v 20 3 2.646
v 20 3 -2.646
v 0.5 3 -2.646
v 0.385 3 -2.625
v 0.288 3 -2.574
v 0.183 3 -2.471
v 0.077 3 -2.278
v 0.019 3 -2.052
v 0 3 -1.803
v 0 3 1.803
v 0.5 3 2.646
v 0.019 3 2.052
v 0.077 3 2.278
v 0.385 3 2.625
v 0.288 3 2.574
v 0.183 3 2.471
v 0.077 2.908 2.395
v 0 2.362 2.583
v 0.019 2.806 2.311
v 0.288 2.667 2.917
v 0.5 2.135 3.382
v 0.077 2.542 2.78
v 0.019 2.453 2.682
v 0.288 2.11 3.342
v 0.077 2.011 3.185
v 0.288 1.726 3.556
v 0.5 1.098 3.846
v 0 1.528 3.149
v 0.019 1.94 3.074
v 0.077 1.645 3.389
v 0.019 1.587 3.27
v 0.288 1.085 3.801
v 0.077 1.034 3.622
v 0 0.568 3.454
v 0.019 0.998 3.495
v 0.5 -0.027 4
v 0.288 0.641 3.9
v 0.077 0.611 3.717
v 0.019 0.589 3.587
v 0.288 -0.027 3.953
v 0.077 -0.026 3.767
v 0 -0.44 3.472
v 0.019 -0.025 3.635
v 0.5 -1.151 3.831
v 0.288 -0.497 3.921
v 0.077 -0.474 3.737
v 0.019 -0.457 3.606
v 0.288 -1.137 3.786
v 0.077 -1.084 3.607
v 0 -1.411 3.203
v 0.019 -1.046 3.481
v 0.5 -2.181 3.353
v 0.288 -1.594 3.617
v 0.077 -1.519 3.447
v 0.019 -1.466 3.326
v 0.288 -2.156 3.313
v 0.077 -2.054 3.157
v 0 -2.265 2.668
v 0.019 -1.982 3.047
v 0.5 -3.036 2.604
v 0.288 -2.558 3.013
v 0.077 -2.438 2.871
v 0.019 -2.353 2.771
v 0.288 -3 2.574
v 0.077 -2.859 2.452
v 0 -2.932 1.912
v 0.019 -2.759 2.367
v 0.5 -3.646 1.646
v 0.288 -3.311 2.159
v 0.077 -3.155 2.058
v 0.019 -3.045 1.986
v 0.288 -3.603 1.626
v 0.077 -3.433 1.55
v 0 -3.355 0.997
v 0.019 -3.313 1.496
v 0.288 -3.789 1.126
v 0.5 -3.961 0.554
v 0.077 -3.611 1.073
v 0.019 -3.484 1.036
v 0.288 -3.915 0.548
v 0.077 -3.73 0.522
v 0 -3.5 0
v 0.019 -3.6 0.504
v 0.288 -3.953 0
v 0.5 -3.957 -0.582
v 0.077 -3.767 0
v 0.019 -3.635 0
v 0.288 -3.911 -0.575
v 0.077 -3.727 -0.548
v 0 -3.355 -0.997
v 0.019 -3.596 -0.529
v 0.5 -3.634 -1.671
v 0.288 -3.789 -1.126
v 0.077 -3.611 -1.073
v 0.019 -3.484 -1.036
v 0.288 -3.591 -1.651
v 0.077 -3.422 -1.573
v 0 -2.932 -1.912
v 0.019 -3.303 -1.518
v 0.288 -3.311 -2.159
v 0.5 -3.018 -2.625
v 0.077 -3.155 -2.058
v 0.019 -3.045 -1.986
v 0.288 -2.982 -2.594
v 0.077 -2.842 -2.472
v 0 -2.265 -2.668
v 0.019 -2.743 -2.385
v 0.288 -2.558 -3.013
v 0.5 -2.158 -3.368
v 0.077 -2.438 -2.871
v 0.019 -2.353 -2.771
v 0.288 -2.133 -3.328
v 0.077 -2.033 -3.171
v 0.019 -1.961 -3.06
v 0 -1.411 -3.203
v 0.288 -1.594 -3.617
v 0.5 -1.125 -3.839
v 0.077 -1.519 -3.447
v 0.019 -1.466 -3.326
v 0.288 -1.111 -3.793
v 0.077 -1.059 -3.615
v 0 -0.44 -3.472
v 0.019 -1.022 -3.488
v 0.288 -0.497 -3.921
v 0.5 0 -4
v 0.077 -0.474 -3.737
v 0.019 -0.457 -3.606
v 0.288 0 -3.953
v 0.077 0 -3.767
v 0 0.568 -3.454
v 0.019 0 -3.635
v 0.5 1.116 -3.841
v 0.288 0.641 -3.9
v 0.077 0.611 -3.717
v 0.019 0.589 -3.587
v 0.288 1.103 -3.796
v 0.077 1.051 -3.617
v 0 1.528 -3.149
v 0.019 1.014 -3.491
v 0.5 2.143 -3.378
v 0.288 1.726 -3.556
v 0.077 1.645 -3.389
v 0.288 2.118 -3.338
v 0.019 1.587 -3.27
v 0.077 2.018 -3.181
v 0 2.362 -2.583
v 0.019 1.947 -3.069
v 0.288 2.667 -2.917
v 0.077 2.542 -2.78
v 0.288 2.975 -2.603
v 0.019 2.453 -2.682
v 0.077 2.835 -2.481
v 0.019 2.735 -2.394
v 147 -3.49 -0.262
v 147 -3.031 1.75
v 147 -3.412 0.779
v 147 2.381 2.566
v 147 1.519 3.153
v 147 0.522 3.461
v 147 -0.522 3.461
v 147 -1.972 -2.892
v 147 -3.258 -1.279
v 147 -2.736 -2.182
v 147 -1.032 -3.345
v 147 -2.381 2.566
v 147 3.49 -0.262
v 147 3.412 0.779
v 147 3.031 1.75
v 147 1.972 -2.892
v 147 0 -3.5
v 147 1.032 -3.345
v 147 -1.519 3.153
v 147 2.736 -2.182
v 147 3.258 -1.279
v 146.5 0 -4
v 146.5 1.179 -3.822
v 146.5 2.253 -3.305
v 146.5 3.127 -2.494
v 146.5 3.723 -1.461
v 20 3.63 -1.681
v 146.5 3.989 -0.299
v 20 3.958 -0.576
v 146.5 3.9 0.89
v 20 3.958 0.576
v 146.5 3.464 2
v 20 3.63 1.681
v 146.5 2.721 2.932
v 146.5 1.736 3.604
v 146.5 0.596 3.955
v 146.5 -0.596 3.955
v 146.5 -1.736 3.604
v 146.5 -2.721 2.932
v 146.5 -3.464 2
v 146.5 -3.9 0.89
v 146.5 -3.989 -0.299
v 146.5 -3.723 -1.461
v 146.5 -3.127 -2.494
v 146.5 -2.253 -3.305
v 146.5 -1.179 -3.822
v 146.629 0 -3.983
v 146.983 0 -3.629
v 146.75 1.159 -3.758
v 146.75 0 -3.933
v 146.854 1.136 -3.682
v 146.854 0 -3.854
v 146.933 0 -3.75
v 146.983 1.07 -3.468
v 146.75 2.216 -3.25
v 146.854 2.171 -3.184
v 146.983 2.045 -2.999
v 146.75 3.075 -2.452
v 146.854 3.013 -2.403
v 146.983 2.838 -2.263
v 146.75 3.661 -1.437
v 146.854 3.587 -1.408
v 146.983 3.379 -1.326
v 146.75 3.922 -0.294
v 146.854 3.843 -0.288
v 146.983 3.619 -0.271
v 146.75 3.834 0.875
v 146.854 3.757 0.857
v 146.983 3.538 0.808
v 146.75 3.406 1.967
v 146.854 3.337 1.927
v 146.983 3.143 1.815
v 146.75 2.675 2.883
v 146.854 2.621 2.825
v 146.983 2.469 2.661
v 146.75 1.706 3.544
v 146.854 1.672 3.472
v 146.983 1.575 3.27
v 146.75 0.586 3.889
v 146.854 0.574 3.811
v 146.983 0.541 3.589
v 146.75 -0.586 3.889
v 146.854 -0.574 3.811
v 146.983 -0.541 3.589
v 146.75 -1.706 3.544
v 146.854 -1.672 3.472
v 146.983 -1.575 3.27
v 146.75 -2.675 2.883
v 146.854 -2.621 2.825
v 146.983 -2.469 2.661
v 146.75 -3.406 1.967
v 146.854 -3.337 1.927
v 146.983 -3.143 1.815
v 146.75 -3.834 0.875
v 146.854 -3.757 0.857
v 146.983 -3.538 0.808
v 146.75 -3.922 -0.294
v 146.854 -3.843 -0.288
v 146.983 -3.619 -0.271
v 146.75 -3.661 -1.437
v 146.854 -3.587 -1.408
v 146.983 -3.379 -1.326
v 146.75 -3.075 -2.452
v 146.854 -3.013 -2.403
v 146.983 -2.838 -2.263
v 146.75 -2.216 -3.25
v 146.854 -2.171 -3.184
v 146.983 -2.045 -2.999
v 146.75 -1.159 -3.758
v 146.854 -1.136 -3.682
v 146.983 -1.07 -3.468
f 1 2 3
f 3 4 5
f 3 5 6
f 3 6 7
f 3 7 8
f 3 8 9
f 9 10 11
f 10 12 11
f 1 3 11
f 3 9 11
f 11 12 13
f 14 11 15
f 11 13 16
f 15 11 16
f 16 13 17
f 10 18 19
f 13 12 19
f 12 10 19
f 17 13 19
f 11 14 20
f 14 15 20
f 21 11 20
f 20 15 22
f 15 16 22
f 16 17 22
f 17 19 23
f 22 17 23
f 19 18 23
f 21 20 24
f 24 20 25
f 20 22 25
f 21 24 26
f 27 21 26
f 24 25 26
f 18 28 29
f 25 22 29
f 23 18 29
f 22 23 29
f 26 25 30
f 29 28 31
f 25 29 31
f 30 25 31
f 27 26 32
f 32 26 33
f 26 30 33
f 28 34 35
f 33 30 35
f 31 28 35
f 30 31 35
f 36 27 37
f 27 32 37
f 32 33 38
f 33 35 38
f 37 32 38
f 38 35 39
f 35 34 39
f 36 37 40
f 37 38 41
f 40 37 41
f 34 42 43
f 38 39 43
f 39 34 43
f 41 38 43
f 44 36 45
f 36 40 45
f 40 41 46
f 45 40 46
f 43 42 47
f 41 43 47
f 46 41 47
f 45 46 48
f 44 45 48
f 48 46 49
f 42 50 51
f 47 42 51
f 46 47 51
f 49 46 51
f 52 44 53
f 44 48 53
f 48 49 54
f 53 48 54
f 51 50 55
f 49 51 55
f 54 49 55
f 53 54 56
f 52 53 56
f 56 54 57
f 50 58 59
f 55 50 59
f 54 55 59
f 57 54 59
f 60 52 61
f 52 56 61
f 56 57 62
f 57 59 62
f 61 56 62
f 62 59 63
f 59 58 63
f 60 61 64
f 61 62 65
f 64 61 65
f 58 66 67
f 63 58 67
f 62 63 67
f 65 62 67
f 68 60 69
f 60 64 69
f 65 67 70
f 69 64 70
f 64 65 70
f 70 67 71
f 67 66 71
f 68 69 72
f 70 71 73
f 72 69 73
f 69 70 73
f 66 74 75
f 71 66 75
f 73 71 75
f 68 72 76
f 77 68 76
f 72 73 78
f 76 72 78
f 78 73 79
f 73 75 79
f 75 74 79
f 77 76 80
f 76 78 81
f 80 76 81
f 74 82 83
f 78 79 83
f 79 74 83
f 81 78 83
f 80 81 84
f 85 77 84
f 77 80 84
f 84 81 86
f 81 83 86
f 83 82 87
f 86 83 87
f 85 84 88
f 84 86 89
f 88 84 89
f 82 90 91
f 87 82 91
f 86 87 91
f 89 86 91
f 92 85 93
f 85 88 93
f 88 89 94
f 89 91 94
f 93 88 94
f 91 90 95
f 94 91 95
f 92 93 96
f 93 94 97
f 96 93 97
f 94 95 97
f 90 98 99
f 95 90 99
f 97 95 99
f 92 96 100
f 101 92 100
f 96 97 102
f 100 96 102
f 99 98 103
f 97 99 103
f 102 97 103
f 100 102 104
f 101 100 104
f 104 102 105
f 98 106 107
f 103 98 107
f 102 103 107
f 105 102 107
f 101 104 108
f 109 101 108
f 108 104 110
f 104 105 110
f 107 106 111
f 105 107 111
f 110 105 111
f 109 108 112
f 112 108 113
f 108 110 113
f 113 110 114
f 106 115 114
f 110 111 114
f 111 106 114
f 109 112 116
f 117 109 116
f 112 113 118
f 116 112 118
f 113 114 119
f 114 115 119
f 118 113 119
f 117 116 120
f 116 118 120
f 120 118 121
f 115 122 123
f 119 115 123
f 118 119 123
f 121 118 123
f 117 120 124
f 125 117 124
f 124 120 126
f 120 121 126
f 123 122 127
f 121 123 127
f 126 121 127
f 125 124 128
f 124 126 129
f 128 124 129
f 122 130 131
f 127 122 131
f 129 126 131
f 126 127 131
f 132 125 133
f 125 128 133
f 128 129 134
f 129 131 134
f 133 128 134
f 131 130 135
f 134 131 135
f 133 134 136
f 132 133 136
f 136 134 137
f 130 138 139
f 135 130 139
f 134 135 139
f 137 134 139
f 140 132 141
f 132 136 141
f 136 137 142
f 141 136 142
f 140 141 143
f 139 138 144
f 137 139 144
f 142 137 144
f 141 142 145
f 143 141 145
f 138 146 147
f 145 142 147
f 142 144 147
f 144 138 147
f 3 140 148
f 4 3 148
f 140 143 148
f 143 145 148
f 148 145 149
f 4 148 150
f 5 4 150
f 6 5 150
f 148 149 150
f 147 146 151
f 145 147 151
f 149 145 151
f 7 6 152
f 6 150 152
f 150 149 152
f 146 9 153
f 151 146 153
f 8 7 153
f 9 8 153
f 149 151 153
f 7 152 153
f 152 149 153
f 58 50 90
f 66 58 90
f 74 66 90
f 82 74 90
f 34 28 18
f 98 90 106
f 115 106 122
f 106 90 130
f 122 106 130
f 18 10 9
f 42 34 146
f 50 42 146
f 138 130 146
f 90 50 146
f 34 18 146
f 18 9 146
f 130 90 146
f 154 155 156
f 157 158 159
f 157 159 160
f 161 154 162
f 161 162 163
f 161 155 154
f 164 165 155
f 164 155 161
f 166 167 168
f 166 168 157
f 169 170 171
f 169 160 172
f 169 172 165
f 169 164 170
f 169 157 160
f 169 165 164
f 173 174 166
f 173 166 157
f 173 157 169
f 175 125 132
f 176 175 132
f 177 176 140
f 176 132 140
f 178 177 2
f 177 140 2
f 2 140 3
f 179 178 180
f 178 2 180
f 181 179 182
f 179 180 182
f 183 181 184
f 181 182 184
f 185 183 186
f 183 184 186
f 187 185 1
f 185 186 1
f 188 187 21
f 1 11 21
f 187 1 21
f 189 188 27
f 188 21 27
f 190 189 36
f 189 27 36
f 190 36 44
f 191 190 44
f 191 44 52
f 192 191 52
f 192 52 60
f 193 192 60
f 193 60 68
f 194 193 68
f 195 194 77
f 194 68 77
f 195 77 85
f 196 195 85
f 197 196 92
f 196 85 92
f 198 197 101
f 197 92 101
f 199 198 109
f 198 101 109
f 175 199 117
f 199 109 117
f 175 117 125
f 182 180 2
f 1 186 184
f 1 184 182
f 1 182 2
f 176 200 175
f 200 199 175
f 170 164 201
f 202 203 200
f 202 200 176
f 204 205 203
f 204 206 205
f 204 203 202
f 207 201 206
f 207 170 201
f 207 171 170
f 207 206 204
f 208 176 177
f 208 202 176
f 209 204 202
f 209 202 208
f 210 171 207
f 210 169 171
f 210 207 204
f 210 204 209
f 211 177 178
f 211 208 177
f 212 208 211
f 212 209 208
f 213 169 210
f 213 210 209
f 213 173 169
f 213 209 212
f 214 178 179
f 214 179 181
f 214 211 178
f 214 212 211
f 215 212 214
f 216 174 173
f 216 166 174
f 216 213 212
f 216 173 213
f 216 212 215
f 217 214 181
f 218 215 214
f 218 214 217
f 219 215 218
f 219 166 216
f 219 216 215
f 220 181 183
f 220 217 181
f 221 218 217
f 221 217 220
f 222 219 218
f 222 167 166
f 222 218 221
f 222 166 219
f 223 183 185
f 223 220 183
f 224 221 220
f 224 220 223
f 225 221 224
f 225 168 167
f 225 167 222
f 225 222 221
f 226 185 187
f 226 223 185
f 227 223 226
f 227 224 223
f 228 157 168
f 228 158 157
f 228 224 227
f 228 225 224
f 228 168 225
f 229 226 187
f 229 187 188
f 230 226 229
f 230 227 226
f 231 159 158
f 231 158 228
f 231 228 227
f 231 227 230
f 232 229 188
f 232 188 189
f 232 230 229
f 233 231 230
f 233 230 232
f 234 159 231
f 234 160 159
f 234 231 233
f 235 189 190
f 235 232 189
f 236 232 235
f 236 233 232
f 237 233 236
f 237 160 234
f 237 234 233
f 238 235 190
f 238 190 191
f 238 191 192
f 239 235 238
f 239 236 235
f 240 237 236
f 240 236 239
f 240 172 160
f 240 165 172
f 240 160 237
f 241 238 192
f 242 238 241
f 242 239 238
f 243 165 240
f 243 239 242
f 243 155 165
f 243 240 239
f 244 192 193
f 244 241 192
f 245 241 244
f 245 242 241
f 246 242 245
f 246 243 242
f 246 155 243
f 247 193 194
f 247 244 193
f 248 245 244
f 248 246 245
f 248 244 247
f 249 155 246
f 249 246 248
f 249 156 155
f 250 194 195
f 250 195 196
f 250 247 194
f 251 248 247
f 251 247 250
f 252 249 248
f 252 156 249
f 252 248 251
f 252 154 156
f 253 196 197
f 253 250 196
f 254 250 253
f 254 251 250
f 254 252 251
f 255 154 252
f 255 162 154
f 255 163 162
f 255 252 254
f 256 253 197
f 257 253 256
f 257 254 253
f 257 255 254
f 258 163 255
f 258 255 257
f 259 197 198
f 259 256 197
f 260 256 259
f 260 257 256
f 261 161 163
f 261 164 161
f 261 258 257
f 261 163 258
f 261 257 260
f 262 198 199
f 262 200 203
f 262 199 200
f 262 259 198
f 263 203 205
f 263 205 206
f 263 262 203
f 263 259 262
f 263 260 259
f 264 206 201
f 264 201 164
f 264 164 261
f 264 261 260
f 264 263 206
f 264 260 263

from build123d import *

# Parameters (mm, degrees)
SKETCH1_R           = 4
BOSS_EXTRUDE1_DEPTH = 147
FILLET1_R           = 0.5
SKETCH2_W           = 6.178297582
SKETCH2_H           = 2
CUT_EXTRUDE1_DEPTH  = 20


with BuildPart() as part:
    # Sketch1 → Boss-Extrude1 (new body)
    with BuildSketch(Plane(origin=(0, 0, 0), x_dir=(0, 0, -1), z_dir=(1, 0, 0))):
        Circle(SKETCH1_R)
    extrude(amount=BOSS_EXTRUDE1_DEPTH)

    # Fillet1
    fillet1_edges = [part.edges().sort_by_distance(p)[0] for p in [
        (0, 0, 4),
        (147, 0, 4),
    ]]
    fillet(fillet1_edges, radius=FILLET1_R)

    # Sketch2 → Cut-Extrude1 (cut)
    with BuildSketch(Plane.ZY):
        with Locations((0, 4)):
            Rectangle(SKETCH2_W, SKETCH2_H)
    extrude(amount=-CUT_EXTRUDE1_DEPTH, mode=Mode.SUBTRACT)


solid = part.part
